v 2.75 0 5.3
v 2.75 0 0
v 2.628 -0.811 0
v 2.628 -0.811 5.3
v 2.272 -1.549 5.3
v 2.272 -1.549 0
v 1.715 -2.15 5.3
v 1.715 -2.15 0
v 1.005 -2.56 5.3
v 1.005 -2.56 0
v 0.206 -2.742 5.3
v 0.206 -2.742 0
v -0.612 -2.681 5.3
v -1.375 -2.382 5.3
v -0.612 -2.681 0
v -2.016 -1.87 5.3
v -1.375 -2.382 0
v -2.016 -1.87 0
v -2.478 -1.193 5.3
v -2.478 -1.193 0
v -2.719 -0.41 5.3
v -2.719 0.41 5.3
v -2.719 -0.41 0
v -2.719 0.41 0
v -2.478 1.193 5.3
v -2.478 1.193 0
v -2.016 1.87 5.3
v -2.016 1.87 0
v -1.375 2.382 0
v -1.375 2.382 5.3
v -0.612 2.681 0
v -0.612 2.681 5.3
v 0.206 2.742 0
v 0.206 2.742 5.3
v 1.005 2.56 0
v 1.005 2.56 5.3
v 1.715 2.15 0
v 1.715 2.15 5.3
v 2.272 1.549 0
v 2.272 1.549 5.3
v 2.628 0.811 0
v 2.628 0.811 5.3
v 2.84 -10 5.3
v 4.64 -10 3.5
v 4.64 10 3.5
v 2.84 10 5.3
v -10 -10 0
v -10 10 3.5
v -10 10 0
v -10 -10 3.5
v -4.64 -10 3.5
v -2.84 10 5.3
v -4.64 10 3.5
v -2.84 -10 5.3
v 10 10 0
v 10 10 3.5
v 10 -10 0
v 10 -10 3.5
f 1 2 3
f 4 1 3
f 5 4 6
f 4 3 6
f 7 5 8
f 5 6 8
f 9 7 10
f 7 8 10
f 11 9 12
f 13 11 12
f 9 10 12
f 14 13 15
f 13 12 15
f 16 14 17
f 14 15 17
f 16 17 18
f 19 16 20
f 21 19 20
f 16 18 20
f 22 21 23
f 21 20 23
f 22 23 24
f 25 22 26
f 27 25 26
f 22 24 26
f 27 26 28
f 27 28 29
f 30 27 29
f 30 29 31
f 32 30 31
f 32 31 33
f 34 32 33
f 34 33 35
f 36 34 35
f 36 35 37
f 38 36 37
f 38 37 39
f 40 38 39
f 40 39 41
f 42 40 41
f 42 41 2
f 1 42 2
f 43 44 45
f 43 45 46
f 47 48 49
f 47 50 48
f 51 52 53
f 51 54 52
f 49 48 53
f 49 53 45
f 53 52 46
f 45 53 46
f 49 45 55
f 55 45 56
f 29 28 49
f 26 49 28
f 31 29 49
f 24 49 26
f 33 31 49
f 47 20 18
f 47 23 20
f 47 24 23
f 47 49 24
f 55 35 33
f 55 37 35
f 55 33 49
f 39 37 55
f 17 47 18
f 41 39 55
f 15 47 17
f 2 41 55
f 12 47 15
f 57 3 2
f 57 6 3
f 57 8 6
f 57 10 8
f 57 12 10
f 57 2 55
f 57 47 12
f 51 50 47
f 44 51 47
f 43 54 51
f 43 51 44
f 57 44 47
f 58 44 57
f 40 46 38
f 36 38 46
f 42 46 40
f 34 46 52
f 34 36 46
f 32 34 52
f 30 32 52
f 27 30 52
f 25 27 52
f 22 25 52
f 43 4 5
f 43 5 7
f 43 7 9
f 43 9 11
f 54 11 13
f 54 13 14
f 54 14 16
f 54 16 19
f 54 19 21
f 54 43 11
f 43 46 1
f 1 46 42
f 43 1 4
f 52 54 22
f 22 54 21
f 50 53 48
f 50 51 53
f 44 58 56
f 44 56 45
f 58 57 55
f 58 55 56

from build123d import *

# Parameters (mm, degrees)
F1_DEPTH = 10
F2_R     = 2.75
F3_DEPTH = 5.301


with BuildPart() as f1:
    # F0 (on Front) → F1 (new body, symmetric)
    with BuildSketch(Plane.XZ):
        Polygon((-10, 3.5), (-10, 0), (10, 0), (10, 3.5), (4.64, 3.5), (2.84, 5.3), (-2.84, 5.3), (-4.64, 3.5), align=None)
    extrude(amount=F1_DEPTH, both=True)

    # F2 (on face) → F3 (cut, through all)
    with BuildSketch(Plane(origin=(0, 0, 0), x_dir=(1, 0, 0), z_dir=(0, 0, -1))):
        Circle(F2_R)
    extrude(amount=-F3_DEPTH, mode=Mode.SUBTRACT)


solid = f1.part
